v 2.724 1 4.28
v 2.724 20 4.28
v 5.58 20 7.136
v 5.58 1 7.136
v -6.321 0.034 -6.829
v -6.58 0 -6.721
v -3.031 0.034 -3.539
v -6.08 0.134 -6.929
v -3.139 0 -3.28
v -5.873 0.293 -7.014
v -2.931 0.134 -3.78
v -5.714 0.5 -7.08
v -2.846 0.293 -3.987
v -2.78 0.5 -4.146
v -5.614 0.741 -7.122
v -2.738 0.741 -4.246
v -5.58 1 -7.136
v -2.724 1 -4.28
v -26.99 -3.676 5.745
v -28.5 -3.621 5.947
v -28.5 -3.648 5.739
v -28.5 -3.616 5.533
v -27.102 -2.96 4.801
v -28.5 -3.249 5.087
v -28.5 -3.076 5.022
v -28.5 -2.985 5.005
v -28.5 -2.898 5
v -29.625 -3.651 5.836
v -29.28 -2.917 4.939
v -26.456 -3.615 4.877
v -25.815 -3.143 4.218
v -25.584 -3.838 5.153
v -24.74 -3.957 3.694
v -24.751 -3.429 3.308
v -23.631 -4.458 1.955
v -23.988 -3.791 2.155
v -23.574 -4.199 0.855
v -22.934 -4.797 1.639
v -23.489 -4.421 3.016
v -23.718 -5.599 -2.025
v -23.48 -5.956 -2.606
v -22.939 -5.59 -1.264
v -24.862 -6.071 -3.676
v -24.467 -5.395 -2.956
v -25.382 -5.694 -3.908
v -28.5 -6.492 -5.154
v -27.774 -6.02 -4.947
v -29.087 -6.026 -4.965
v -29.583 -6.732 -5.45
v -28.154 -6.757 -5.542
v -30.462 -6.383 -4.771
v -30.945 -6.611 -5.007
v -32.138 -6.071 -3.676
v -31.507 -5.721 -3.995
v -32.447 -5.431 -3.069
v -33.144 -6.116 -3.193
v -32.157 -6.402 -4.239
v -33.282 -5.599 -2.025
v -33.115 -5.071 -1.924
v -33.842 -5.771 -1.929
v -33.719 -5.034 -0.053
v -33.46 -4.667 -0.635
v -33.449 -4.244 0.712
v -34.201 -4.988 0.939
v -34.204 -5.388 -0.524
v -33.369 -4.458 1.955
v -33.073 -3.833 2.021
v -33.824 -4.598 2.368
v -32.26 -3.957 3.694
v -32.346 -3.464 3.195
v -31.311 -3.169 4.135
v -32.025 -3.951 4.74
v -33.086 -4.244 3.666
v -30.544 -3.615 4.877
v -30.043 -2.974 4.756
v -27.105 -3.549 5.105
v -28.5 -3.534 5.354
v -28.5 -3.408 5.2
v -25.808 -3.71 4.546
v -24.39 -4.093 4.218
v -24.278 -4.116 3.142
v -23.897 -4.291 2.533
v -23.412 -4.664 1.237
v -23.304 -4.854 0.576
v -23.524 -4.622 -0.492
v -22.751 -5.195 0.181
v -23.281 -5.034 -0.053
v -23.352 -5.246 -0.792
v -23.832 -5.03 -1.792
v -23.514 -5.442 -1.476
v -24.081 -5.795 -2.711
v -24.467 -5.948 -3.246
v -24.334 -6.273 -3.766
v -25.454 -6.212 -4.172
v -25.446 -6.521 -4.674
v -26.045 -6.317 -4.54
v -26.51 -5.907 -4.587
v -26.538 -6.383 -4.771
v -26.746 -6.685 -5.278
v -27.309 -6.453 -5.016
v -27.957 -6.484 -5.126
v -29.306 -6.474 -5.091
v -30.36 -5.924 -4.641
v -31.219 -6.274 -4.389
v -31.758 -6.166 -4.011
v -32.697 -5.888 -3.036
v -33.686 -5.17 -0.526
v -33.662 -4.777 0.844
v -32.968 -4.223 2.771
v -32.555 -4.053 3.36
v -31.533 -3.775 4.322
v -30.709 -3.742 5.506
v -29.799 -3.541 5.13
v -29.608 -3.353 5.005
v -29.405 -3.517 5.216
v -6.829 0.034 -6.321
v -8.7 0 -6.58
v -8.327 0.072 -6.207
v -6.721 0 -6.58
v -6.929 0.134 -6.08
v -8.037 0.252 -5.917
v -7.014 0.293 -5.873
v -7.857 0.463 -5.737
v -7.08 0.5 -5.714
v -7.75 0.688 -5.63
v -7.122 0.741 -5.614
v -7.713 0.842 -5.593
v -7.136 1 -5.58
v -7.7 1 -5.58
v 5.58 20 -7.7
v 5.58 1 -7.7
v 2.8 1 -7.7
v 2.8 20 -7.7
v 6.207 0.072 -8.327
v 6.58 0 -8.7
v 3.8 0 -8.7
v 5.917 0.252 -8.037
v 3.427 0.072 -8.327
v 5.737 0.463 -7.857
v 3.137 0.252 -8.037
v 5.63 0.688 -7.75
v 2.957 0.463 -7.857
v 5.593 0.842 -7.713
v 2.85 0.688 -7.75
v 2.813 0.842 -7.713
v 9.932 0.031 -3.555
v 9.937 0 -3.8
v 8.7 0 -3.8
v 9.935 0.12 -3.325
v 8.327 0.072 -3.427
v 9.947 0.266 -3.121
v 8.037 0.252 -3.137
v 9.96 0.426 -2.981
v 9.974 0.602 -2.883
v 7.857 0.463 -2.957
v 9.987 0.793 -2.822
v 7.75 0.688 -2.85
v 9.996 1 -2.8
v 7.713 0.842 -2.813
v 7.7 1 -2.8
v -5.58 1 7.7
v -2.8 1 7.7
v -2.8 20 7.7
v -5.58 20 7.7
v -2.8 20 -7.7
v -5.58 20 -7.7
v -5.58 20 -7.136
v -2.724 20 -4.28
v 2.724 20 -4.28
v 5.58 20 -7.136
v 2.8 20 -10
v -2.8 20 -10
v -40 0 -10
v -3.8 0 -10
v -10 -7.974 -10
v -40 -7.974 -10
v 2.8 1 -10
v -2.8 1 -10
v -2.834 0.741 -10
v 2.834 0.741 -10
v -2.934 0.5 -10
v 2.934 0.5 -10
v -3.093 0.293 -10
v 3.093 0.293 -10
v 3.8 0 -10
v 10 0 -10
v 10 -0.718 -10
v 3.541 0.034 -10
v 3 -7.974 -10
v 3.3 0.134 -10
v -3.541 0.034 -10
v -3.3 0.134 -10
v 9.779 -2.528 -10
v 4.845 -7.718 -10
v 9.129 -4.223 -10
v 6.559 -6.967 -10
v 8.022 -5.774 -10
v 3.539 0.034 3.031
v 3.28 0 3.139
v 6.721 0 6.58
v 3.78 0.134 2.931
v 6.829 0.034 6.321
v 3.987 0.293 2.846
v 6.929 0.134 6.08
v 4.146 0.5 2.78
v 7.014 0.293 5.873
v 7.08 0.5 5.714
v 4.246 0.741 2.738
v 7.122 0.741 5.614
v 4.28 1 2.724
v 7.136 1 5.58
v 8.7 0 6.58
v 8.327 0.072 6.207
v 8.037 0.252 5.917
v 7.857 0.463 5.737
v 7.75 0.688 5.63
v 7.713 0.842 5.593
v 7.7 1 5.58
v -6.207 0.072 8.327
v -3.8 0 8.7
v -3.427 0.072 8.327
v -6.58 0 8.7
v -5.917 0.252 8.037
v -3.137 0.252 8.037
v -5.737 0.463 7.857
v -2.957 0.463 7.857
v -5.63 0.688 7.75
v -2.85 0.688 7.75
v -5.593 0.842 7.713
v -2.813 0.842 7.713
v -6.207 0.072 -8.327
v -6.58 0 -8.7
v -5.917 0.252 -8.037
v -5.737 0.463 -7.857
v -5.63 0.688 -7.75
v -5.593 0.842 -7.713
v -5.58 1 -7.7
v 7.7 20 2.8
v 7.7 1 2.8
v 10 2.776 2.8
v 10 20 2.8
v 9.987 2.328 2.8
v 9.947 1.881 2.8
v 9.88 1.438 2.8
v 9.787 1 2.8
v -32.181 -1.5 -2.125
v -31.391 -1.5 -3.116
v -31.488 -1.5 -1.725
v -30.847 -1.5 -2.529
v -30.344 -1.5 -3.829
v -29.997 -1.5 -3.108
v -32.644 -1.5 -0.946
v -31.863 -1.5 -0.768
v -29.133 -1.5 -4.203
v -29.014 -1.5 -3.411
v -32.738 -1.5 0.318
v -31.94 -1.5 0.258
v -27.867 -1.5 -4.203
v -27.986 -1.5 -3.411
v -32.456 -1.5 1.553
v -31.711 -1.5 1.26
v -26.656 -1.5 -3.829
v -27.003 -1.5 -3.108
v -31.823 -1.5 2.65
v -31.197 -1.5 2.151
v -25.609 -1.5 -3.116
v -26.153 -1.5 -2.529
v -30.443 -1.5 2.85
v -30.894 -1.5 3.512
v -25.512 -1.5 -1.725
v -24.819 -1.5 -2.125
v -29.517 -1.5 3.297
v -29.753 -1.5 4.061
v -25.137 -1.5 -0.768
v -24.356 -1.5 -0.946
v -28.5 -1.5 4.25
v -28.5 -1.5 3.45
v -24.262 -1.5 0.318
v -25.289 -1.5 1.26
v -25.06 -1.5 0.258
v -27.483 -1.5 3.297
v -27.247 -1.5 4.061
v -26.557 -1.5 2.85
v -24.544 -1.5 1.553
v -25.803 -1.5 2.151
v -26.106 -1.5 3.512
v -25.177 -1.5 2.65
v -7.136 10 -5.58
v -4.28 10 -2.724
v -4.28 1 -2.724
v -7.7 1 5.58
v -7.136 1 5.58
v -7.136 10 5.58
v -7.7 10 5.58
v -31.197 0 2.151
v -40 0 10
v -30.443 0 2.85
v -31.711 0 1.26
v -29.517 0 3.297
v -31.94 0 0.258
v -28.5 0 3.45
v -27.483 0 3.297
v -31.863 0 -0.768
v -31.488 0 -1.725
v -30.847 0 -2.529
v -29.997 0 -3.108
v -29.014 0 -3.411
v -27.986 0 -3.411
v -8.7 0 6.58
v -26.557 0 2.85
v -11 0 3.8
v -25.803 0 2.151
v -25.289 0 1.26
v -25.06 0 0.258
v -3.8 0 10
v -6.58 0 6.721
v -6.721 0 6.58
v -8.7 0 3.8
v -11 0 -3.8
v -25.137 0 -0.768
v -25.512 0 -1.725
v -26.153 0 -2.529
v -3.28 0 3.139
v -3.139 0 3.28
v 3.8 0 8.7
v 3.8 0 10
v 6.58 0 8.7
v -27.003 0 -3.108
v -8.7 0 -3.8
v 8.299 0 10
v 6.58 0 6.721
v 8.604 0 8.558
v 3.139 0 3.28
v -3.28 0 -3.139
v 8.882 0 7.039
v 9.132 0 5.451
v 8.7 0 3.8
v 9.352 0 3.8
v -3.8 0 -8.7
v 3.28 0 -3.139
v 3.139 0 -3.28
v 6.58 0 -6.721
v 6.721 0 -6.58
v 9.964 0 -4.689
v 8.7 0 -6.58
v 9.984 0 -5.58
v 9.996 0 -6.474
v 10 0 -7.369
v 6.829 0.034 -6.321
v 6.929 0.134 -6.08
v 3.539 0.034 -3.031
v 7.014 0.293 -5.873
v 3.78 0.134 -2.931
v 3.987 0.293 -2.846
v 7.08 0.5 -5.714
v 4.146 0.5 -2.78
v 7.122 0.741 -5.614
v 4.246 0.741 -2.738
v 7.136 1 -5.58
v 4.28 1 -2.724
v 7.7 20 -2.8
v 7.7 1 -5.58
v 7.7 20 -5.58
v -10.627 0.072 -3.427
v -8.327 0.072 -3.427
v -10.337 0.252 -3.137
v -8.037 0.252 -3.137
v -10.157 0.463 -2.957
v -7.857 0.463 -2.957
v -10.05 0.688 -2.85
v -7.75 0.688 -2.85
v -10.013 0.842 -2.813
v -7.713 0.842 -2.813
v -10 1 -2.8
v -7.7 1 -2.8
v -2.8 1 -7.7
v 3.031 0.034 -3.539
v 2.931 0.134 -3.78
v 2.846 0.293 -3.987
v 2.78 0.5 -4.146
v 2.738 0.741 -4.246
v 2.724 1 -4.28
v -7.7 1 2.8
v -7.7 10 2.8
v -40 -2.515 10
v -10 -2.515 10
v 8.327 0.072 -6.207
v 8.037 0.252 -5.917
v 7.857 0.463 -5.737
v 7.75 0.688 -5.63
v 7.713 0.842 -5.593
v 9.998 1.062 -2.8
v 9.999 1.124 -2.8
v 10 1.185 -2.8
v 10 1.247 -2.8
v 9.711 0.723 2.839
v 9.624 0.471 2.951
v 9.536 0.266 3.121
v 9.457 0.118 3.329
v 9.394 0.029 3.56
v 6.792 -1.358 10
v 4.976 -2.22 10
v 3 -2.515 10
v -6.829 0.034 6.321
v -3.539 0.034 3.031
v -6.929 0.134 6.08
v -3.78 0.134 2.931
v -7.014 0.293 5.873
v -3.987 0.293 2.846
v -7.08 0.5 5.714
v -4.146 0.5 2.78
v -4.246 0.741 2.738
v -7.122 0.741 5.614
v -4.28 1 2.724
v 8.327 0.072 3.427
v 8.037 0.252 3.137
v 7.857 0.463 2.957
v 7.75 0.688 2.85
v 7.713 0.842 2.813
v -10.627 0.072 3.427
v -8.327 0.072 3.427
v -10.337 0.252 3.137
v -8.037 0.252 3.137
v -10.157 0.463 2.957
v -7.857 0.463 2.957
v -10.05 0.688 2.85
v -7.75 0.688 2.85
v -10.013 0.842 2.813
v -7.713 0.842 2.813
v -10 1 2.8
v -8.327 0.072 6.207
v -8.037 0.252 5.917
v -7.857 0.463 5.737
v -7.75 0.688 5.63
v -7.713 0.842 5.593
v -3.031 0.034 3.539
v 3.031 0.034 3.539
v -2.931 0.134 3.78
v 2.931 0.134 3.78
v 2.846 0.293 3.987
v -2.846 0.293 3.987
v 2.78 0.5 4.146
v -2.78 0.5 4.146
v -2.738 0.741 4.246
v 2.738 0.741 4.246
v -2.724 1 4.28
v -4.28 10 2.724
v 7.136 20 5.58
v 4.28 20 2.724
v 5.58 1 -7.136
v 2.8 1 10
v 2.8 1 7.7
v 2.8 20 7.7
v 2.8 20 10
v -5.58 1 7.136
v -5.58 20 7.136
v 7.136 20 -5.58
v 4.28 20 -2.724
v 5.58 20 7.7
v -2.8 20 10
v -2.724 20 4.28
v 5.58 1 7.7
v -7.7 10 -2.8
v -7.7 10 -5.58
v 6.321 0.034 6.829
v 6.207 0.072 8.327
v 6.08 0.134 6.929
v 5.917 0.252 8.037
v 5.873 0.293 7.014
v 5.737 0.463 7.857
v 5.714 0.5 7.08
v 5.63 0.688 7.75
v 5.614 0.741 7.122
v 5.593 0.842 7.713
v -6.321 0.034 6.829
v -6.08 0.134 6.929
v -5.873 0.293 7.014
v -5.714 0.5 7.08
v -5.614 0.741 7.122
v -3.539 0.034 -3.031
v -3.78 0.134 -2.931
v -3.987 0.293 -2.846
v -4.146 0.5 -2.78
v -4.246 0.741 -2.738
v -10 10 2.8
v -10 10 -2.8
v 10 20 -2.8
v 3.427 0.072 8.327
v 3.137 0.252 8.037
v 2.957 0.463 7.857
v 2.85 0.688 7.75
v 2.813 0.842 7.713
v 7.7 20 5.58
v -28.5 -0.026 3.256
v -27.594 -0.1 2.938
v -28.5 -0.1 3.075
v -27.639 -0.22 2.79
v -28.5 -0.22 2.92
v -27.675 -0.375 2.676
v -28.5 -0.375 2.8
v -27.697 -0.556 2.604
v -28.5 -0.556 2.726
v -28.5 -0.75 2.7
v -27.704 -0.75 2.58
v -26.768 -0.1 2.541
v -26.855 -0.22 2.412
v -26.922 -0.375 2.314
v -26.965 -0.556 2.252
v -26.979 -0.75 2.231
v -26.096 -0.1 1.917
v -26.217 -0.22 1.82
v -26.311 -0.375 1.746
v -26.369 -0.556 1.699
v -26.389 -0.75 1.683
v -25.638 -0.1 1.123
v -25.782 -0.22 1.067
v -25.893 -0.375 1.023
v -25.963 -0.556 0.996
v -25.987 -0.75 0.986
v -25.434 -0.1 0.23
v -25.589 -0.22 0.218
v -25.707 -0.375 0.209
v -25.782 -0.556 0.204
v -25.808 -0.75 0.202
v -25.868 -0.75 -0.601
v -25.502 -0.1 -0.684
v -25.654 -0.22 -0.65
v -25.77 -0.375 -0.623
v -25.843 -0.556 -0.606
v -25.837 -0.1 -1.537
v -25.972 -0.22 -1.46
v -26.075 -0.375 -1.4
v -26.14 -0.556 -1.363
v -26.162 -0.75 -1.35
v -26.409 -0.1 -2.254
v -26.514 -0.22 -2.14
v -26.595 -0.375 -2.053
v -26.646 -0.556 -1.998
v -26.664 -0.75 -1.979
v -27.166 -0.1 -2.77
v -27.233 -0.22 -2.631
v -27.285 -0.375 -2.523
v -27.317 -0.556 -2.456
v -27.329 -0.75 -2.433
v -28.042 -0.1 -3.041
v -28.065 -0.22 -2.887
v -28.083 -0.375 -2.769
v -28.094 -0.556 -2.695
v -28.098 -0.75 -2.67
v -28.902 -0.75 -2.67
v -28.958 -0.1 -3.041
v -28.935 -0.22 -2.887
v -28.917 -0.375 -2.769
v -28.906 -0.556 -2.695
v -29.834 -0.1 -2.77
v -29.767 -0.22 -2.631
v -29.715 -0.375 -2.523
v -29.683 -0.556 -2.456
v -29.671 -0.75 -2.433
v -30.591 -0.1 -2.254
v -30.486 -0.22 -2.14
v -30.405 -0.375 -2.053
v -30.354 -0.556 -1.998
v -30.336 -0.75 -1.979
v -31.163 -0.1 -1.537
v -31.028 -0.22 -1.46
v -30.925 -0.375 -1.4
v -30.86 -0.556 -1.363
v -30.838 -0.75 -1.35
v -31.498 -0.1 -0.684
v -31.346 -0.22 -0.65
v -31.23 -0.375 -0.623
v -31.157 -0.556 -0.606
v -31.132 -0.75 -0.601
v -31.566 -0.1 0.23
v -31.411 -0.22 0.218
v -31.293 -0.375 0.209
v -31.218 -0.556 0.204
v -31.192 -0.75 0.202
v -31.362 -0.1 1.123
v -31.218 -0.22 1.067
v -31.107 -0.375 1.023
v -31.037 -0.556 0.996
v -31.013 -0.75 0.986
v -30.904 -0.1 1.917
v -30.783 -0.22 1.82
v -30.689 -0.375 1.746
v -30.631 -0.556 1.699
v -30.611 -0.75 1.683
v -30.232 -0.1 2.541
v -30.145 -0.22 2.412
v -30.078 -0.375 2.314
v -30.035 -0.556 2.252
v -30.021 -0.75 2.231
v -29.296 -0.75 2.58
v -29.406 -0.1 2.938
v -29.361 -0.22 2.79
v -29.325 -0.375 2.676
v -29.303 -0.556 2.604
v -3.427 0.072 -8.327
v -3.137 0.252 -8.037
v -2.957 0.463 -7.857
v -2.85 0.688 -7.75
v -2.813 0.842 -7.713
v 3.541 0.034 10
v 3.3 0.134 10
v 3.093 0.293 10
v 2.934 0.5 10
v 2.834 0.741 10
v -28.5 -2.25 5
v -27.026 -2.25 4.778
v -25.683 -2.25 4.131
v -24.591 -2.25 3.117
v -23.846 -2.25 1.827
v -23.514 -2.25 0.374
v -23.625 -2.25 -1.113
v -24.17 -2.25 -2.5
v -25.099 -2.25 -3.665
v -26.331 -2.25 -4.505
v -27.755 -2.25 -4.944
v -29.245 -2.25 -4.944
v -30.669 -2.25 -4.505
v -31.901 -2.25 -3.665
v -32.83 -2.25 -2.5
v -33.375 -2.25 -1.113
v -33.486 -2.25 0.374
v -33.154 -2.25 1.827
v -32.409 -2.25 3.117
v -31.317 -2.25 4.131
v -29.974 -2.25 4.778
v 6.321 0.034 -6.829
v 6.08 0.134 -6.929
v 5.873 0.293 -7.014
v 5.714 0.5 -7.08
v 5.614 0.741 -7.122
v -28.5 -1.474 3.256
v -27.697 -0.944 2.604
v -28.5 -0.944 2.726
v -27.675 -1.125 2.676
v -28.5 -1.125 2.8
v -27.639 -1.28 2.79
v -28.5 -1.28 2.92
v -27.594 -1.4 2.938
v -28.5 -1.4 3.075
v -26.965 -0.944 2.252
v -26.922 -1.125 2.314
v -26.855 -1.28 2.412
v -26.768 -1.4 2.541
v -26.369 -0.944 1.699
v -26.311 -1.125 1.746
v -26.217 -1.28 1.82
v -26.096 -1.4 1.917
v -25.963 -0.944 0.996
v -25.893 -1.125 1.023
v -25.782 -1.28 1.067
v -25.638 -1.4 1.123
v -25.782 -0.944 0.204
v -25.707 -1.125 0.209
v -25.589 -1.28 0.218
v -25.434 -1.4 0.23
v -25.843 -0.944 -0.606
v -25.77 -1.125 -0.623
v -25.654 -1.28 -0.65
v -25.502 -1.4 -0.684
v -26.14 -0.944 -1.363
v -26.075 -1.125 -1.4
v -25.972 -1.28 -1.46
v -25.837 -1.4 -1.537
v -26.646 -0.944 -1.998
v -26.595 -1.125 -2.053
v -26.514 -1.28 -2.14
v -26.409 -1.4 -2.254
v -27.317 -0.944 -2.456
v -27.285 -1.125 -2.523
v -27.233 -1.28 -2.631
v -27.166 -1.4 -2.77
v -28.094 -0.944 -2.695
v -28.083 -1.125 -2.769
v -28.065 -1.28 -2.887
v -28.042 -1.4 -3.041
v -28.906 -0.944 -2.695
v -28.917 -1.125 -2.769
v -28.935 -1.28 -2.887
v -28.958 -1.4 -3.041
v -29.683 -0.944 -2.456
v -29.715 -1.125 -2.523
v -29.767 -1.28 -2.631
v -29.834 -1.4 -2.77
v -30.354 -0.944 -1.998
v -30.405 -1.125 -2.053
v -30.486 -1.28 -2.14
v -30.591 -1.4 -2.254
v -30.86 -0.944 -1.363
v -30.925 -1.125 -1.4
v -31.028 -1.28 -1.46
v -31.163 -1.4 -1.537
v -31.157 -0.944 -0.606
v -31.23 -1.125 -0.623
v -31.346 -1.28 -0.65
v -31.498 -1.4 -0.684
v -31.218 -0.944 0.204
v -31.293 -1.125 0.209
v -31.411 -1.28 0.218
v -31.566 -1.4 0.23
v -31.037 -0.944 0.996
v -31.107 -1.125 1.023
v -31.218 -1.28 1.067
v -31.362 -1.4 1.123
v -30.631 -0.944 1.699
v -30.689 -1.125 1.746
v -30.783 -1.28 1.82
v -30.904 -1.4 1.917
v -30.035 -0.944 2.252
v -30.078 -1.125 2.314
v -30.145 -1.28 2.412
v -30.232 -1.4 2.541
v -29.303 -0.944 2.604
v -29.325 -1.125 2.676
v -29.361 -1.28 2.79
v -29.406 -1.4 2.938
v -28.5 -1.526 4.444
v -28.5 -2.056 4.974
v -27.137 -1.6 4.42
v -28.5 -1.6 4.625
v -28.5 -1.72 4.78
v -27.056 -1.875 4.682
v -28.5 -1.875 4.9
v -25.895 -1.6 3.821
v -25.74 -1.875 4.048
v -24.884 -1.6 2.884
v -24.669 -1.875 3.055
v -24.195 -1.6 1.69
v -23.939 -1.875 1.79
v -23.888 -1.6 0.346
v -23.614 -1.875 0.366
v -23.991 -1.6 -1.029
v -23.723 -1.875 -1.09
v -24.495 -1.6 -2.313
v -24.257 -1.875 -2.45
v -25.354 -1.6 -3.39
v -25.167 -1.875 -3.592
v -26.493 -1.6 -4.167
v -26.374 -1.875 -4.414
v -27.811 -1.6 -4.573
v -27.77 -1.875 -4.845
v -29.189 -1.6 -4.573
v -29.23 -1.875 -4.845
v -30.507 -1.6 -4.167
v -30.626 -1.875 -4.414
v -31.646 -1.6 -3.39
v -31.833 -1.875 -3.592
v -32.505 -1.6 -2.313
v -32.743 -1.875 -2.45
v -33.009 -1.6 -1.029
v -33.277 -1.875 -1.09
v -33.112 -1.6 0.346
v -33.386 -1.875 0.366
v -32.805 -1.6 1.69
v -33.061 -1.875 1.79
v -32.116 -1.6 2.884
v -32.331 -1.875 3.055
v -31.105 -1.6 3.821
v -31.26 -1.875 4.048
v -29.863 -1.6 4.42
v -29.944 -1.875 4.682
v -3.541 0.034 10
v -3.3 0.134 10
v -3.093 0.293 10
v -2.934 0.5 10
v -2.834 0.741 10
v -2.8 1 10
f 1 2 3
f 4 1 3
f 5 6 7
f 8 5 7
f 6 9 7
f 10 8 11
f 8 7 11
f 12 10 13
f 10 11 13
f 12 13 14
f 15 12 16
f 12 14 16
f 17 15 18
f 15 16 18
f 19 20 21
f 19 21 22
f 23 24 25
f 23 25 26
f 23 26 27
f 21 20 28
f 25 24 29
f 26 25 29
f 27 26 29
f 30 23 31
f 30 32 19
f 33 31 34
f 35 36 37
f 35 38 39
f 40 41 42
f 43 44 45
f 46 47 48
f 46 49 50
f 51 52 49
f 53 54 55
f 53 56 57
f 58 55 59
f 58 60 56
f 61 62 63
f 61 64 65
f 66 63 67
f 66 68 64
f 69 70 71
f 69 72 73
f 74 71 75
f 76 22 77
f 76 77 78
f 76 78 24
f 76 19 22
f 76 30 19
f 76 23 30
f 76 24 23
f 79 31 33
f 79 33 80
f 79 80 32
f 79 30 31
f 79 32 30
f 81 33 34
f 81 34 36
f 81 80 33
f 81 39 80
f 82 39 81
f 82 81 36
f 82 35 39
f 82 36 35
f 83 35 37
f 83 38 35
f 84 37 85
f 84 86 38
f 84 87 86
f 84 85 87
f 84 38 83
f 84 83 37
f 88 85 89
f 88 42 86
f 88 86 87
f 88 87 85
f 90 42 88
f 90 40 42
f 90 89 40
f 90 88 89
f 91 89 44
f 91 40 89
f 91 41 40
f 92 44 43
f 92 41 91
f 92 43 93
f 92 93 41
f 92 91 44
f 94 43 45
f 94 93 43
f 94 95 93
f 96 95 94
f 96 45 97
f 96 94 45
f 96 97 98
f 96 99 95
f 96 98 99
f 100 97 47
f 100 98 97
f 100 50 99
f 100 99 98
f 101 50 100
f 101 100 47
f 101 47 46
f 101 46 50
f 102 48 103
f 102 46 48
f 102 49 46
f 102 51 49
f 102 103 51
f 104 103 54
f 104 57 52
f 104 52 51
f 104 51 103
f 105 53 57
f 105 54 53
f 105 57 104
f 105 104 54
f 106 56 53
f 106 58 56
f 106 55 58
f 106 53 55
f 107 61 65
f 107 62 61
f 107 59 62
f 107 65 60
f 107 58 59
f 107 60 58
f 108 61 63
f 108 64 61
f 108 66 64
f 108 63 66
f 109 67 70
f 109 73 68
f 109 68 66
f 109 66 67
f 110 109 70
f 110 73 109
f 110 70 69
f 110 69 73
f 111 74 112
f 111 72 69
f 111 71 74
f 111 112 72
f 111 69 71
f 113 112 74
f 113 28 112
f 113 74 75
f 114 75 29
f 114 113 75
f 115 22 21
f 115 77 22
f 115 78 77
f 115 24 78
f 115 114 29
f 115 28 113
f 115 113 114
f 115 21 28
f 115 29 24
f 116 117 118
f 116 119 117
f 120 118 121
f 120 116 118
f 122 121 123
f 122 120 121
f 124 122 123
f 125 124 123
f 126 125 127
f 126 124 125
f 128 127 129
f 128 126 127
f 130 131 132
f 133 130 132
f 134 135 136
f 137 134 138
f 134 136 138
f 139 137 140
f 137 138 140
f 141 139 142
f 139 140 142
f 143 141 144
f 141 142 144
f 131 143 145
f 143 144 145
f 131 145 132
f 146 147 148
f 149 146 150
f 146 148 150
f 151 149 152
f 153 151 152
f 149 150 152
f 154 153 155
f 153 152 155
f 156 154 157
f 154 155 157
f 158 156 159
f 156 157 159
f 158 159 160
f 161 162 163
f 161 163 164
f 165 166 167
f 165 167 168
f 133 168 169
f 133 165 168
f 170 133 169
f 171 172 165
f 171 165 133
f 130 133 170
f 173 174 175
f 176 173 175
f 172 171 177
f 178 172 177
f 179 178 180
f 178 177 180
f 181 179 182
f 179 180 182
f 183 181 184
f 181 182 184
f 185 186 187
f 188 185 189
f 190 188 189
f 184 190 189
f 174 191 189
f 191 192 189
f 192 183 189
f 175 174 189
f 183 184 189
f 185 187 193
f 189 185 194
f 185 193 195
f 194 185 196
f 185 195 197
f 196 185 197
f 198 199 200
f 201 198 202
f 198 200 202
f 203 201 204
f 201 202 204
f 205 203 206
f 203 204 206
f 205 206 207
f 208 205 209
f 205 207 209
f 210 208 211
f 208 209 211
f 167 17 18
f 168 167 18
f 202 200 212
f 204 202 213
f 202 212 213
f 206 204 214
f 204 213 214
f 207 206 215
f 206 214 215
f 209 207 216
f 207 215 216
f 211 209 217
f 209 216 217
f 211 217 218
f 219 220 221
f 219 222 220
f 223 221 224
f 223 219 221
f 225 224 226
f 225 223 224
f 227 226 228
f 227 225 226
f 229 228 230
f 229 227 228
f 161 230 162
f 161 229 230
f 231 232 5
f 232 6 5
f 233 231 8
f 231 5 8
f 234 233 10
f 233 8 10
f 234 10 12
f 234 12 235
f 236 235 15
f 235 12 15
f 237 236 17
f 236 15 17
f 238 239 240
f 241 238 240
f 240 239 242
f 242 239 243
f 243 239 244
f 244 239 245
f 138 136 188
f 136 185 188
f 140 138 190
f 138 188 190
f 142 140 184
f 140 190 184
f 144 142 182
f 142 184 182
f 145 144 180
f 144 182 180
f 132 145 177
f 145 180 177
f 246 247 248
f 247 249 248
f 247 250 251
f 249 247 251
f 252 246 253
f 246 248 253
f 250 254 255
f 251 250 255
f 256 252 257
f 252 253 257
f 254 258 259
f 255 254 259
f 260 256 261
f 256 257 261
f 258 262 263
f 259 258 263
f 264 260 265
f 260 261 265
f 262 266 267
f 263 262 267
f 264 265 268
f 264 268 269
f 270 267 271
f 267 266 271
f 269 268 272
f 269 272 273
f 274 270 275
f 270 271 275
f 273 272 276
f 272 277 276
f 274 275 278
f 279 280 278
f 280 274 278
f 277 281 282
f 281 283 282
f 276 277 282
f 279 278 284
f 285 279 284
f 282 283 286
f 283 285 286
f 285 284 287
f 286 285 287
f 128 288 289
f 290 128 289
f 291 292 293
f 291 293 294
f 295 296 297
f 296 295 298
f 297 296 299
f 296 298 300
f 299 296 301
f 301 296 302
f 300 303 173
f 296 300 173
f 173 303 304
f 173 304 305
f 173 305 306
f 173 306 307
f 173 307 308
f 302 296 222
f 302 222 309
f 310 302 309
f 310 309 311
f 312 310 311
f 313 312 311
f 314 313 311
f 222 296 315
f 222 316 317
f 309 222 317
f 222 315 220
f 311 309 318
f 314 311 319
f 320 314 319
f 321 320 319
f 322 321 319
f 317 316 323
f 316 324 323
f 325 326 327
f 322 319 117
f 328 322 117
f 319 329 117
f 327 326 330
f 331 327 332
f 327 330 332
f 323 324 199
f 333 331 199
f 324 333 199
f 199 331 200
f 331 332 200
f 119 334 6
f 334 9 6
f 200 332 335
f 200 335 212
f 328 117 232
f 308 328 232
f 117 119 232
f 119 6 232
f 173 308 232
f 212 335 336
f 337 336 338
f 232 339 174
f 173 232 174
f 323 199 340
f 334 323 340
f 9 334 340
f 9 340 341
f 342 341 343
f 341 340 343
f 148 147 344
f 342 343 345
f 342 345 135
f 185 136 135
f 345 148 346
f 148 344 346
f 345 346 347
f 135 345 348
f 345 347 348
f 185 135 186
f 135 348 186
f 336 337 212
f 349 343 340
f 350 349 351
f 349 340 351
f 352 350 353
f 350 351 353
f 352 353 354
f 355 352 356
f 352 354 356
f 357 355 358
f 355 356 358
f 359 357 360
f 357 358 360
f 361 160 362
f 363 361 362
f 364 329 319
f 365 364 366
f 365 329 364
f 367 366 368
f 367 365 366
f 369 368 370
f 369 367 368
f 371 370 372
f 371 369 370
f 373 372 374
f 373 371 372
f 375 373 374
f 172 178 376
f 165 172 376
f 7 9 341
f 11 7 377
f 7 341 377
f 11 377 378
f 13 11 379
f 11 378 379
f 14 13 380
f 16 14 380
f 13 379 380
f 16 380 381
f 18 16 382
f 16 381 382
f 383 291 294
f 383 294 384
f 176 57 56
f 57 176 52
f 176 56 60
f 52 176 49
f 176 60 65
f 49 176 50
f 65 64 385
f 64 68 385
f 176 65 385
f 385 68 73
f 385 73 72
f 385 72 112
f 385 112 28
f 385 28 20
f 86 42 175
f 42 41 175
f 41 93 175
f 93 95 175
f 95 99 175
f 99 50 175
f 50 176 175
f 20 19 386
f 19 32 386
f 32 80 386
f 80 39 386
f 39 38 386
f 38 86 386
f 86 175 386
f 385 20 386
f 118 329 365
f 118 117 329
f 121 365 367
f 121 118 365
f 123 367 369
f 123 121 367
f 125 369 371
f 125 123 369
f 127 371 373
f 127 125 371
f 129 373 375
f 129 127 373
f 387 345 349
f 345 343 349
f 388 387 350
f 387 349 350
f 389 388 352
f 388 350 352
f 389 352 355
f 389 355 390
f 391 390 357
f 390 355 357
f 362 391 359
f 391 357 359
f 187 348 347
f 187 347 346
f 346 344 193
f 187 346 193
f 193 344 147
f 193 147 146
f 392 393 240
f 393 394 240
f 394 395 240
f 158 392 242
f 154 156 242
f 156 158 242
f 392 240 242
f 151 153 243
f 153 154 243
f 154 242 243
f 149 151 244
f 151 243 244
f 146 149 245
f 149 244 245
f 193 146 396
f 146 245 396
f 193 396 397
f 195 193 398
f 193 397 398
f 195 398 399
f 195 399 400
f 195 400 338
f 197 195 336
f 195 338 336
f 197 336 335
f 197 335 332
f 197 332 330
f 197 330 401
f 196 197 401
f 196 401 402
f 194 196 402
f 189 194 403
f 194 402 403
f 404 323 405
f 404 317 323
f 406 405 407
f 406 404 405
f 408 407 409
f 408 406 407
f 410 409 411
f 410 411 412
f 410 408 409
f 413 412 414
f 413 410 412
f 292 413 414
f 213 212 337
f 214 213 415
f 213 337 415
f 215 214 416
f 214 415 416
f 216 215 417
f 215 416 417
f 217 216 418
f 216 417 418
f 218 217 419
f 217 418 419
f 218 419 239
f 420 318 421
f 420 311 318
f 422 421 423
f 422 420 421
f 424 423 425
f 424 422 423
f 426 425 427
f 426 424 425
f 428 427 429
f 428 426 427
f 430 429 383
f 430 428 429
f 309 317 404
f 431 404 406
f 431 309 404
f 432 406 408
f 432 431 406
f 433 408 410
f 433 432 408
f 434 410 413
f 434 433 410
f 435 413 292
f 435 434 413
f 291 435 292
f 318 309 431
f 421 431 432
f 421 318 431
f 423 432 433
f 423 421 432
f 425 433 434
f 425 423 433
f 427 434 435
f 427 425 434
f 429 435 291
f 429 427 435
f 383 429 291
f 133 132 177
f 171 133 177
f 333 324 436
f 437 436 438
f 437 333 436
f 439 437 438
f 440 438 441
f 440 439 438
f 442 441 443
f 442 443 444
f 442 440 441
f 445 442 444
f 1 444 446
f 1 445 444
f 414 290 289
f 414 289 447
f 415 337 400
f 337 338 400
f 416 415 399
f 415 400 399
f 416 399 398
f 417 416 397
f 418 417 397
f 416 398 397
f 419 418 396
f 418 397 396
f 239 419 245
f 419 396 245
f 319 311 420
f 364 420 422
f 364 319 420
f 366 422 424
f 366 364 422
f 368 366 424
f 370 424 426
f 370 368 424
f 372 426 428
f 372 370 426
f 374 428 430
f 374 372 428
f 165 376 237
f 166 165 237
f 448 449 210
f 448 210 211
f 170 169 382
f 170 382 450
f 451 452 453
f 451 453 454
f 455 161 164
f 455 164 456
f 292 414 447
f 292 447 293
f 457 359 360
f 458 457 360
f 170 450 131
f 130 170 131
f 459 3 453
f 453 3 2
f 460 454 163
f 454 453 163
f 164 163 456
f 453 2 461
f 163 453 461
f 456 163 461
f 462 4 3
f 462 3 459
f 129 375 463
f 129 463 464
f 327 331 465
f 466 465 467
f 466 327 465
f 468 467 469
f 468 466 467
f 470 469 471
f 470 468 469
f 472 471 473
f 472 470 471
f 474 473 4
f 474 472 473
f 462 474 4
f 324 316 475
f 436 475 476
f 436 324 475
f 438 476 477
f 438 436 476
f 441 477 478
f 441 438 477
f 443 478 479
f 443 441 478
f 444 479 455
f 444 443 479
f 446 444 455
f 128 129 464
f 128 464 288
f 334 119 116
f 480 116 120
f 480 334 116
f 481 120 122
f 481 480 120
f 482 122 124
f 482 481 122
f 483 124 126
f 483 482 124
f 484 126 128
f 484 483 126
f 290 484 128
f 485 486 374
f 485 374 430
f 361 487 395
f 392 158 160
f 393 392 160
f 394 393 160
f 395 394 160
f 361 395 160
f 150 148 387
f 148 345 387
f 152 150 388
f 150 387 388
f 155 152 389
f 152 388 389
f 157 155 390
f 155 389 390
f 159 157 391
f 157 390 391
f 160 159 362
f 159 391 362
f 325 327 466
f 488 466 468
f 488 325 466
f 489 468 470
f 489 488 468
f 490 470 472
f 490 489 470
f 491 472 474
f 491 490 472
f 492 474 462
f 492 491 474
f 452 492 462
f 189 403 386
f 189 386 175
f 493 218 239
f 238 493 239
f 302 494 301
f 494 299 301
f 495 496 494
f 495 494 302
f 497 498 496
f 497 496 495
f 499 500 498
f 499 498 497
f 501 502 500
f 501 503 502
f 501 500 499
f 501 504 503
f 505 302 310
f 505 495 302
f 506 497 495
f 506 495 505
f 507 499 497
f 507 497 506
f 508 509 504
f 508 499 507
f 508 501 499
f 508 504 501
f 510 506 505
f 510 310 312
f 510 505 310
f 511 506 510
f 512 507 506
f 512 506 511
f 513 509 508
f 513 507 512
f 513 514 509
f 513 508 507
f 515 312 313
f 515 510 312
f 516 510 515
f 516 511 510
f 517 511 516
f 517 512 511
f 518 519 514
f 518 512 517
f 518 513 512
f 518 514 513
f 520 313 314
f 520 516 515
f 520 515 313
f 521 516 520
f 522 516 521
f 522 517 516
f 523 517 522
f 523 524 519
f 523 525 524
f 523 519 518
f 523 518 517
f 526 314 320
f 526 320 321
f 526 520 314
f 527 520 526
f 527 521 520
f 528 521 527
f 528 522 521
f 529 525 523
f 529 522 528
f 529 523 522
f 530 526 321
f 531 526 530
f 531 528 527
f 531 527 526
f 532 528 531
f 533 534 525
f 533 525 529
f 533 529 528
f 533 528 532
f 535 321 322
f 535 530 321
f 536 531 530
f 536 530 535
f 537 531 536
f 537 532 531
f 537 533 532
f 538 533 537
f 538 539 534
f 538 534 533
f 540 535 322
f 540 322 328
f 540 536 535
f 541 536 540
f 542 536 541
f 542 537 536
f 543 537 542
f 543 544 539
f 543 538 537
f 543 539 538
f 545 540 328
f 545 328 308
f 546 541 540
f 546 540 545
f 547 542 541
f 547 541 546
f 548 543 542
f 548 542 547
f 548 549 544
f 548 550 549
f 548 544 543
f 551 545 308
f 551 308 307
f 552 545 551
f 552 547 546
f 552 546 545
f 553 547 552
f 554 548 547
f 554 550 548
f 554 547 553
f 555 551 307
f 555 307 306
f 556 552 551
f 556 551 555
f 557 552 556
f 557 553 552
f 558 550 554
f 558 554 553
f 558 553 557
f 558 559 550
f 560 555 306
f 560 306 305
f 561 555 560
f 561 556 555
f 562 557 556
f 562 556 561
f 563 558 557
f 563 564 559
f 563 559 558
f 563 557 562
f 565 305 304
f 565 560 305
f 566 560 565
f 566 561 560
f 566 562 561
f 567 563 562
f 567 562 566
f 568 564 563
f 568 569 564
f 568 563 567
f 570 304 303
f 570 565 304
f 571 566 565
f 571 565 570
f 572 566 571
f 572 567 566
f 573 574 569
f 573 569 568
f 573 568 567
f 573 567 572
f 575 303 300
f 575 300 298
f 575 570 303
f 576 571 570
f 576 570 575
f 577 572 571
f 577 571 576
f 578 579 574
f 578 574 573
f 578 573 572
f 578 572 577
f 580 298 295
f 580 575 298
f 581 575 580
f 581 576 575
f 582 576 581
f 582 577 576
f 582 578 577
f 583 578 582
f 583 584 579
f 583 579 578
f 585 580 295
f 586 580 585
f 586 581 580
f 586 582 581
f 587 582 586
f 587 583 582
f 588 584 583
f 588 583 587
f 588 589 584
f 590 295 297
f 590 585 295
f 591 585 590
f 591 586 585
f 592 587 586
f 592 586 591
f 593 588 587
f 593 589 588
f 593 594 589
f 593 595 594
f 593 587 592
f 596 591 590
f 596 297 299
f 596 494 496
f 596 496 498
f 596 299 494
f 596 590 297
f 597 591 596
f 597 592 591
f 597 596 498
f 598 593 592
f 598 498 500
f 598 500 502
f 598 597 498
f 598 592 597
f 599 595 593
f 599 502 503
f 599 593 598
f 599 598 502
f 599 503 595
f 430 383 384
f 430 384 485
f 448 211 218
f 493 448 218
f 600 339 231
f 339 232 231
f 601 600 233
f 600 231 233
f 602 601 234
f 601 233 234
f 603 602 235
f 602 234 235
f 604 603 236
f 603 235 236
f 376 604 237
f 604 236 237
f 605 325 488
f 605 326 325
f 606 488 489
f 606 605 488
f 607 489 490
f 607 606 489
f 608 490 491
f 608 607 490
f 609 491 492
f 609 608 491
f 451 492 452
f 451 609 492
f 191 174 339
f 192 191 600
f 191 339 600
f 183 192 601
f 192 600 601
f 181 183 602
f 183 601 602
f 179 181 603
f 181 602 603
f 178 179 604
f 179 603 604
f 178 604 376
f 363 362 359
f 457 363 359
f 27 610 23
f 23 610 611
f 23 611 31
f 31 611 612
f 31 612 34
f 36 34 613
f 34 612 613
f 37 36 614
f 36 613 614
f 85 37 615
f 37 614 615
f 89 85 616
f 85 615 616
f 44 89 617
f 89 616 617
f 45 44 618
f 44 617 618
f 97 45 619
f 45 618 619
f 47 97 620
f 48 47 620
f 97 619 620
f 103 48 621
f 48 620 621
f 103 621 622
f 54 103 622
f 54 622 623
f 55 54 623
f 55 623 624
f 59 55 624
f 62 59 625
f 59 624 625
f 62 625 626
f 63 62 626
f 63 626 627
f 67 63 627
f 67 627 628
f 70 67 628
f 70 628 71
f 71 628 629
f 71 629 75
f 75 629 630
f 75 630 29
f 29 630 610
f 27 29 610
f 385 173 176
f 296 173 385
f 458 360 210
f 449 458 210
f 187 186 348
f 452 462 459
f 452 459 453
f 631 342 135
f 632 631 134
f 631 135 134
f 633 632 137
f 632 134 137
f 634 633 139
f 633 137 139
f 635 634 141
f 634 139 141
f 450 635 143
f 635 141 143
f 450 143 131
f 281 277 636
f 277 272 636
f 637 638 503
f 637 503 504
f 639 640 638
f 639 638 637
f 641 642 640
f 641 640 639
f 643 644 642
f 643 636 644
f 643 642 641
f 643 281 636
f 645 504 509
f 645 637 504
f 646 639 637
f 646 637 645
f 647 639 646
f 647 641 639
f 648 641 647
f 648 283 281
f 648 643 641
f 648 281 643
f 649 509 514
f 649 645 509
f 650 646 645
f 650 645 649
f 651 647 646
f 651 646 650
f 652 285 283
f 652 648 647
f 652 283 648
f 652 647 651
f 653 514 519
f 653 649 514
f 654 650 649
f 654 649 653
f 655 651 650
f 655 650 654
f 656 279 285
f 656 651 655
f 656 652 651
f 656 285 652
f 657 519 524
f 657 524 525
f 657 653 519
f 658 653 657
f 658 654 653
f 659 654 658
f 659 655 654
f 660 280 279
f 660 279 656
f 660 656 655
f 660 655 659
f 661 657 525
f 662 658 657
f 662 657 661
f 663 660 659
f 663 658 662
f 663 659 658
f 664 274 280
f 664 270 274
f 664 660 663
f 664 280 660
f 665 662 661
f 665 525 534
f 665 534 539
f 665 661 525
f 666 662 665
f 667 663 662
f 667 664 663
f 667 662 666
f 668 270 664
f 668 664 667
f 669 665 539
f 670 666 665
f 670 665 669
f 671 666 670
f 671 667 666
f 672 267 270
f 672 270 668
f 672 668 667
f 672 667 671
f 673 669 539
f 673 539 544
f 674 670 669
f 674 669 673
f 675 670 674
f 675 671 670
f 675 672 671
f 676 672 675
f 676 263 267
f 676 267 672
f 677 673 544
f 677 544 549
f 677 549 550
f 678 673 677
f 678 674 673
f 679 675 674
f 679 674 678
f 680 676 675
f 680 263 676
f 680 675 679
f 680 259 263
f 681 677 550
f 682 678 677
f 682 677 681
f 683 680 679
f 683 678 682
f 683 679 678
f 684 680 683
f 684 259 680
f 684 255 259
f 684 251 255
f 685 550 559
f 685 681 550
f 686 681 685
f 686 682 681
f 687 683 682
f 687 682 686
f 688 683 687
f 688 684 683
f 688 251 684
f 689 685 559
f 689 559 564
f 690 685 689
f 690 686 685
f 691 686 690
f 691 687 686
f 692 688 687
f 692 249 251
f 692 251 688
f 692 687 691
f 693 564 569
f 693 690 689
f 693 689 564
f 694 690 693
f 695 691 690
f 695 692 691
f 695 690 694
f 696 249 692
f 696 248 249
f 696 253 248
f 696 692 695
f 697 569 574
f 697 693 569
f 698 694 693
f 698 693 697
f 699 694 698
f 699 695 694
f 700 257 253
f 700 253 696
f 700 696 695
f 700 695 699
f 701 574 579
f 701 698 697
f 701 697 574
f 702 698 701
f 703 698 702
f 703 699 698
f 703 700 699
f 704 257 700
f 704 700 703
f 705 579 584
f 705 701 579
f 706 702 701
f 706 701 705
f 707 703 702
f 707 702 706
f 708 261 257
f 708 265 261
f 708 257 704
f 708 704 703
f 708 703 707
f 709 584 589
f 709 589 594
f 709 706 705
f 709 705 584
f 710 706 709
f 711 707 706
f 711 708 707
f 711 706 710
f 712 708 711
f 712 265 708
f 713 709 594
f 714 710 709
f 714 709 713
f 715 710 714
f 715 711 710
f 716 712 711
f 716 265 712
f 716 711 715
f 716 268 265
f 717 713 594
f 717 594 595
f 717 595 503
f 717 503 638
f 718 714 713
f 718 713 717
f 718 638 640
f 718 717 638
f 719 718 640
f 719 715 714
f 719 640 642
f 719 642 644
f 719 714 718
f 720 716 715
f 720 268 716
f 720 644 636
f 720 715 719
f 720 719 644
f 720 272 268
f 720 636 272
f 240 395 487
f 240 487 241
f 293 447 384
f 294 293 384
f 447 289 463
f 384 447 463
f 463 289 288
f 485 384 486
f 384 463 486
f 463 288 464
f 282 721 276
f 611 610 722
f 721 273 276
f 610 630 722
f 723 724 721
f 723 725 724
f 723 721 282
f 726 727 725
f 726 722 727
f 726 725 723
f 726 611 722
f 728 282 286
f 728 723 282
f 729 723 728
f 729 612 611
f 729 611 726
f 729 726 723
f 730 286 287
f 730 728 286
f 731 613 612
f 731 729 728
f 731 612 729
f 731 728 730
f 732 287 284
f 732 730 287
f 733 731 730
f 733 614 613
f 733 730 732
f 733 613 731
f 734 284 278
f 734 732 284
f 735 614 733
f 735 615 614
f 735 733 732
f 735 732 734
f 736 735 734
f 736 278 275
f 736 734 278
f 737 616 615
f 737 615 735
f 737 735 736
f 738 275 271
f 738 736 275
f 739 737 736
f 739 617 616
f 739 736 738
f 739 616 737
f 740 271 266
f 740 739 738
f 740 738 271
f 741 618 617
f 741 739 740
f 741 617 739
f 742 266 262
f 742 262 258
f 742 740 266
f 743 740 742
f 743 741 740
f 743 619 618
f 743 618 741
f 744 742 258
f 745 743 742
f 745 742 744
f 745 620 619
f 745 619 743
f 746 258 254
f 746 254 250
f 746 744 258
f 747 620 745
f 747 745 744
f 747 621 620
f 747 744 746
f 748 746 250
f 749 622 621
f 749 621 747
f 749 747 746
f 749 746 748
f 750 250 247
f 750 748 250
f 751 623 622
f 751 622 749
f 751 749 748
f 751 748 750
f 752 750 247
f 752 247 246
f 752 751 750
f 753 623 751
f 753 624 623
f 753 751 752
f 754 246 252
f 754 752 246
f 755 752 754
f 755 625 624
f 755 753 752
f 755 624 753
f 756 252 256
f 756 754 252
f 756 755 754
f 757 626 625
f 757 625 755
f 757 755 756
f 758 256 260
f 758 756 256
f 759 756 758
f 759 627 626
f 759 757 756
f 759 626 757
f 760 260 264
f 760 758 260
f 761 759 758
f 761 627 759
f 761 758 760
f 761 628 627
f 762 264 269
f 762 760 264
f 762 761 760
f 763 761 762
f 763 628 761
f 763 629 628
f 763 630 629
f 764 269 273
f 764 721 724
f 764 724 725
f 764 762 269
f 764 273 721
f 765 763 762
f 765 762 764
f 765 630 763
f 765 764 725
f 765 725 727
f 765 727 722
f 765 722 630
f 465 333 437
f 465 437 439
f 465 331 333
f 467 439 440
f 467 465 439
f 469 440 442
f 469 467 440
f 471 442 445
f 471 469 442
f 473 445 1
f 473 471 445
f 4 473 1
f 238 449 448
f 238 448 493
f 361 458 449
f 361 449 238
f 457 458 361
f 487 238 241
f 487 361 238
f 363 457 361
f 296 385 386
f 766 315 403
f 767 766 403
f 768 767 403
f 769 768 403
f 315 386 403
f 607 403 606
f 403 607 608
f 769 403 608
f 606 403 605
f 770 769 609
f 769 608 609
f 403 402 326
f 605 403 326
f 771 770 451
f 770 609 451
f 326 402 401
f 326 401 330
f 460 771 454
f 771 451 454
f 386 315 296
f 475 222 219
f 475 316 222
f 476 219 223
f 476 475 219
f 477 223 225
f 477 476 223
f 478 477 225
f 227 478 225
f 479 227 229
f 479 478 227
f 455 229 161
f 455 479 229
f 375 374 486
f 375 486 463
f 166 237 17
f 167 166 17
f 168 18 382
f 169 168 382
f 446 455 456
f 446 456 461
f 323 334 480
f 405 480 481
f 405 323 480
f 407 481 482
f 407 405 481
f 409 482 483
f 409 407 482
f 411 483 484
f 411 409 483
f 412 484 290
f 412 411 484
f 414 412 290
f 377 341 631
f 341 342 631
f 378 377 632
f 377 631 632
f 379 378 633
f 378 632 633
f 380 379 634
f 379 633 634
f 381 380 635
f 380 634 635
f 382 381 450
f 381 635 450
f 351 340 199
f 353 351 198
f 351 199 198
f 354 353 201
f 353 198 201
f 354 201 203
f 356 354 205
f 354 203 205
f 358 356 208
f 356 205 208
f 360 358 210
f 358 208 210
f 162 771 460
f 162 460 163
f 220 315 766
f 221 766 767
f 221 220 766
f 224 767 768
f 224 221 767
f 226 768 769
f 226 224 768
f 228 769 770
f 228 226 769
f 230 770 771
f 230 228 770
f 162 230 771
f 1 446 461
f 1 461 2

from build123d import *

# Parameters (mm, degrees)
BOSS_EXTRUDE1_DEPTH   = 20
BOSS_EXTRUDE1_2_DEPTH = 20
BOSS_EXTRUDE1_3_DEPTH = 20
BOSS_EXTRUDE1_4_DEPTH = 20
SKETCH2_W             = 20
SKETCH2_H             = 20
BOSS_EXTRUDE2_DEPTH   = 20
CUT_EXTRUDE1_DEPTH    = 31
BOSS_EXTRUDE3_DEPTH   = 30
FILLET1_R             = 7
CUT_EXTRUDE2_REACH    = 47.826
SKETCH5_R             = 2.7
CUT_EXTRUDE3_REACH    = 48.5
SKETCH6_R             = 5
FILLET5_R             = 1
FILLET6_R             = 0.75
CUT_EXTRUDE4_DEPTH    = 10


# Some blends are built 0.0001 mm under size
with BuildPart() as part:
    # Sketch1 → Boss-Extrude1 (new body)
    with BuildSketch(Plane(origin=(0, 0, 0), x_dir=(1, 0, 0), z_dir=(0, 1, 0))):
        Polygon((-10, -2.8), (-10, 2.8), (-7.7, 2.8), (-7.7, 5.58), (-7.135634919, 5.58), (-4.28, 2.724365081), (-4.28, -2.724365081), (-7.135634919, -5.58), (-7.7, -5.58), (-7.7, -2.8), align=None)
    extrude(amount=BOSS_EXTRUDE1_DEPTH)



with BuildPart() as body_2:
    # Sketch1 → Boss-Extrude1 2 (new body)
    with BuildSketch(Plane(origin=(0, 0, 0), x_dir=(1, 0, 0), z_dir=(0, 1, 0))):
        Polygon((10, 2.8), (7.7, 2.8), (7.7, 5.58), (7.135634919, 5.58), (4.28, 2.724365081), (4.28, -2.724365081), (7.135634919, -5.58), (7.7, -5.58), (7.7, -2.8), (10, -2.8), align=None)
    extrude(amount=BOSS_EXTRUDE1_2_DEPTH)


with BuildPart() as body_3:
    # Sketch1 → Boss-Extrude1 3 (new body)
    with BuildSketch(Plane(origin=(0, 0, 0), x_dir=(1, 0, 0), z_dir=(0, 1, 0))):
        Polygon((2.8, -10), (-2.8, -10), (-2.8, -7.7), (-5.58, -7.7), (-5.58, -7.135634919), (-2.724365081, -4.28), (2.724365081, -4.28), (5.58, -7.135634919), (5.58, -7.7), (2.8, -7.7), align=None)
    extrude(amount=BOSS_EXTRUDE1_3_DEPTH)


with BuildPart() as body_4:
    # Sketch1 → Boss-Extrude1 4 (new body)
    with BuildSketch(Plane(origin=(0, 0, 0), x_dir=(1, 0, 0), z_dir=(0, 1, 0))):
        Polygon((-2.8, 10), (-2.8, 7.7), (-5.58, 7.7), (-5.58, 7.135634919), (-2.724365081, 4.28), (2.724365081, 4.28), (5.58, 7.135634919), (5.58, 7.7), (2.8, 7.7), (2.8, 10), align=None)
    extrude(amount=BOSS_EXTRUDE1_4_DEPTH)


with BuildPart() as part_1:
    add(part.part)

    add(body_2.part)  # Boss-Extrude2 merges body 2

    add(body_3.part)  # Boss-Extrude2 merges body 3

    add(body_4.part)  # Boss-Extrude2 merges body 4
    # Sketch2 → Boss-Extrude2 (add)
    with BuildSketch(Plane.XZ):
        Rectangle(SKETCH2_W, SKETCH2_H)
    extrude(amount=BOSS_EXTRUDE2_DEPTH)

    # Sketch3 → Cut-Extrude1 (cut, through all)
    with BuildSketch(Plane(origin=(10, 0, 0), x_dir=(0, 0, -1), z_dir=(1, 0, 0))):
        Polygon((10.596673941, -8.137212268), (10.596673941, -38.345549702), (-10.411138478, -38.345549702), (-10.411138478, -2.402671747), align=None)
    extrude(amount=-CUT_EXTRUDE1_DEPTH, mode=Mode.SUBTRACT)

    # Sketch4 → Boss-Extrude3 (add)
    with BuildSketch(Plane.ZY.offset(10)):
        Polygon((10, 0), (-10, 0), (-10, -7.974337104), (10, -2.51490096), align=None)
    extrude(amount=BOSS_EXTRUDE3_DEPTH)

    # Fillet1
    # the kernel refuses this fillet: 7 mm, written as the material it takes off along each edge
    with BuildSketch(Plane(origin=(10, 2.093496024, 26.882318479), x_dir=(0, 0.9647039130954435, -0.26333697054978655), z_dir=(0, -0.26333697054978655, -0.9647039130954435))) as fillet1_piece_1:
        with BuildLine():
            CenterArc((FILLET1_R, -FILLET1_R), FILLET1_R, 90, 90)
            Line((0, -FILLET1_R), (0, 0))
            Line((0, 0), (FILLET1_R, 0))
        make_face()
    extrude(amount=55.731749637, mode=Mode.SUBTRACT)

    # Cut-Extrude2: up to this plane
    cut_extrude2_end = Plane(origin=(-10, -8.137212268, -10.596673941), z_dir=(0, 0.9647039130954435, -0.26333697054978655))
    # Sketch5 → Cut-Extrude2 (cut, up to the surface)
    with BuildSketch(Plane(origin=(0, 0, 0), x_dir=(1, 0, 0), z_dir=(0, 1, 0)), mode=Mode.PRIVATE) as cut_extrude2_sk1:
        with Locations(Location((-28.5, 0, 0), (0, 0, 270))):
            Circle(SKETCH5_R)
    cut_extrude2_tool1 = split(extrude(cut_extrude2_sk1.sketch, amount=-CUT_EXTRUDE2_REACH, mode=Mode.PRIVATE), bisect_by=cut_extrude2_end, keep=Keep.BOTH, mode=Mode.PRIVATE)
    add(cut_extrude2_tool1.solids().sort_by_distance((-28.5, 0, 0))[0], mode=Mode.SUBTRACT)

    # Cut-Extrude3: up to this plane
    cut_extrude3_end = Plane(origin=(-10, -8.137212268, -10.596673941), z_dir=(0, 0.9647039130954435, -0.26333697054978655))
    # Sketch6 → Cut-Extrude3 (cut, up to the surface)
    with BuildSketch(Plane(origin=(0, -1.5, 0), x_dir=(1, 0, 0), z_dir=(0, 1, 0)), mode=Mode.PRIVATE) as cut_extrude3_sk1:
        with Locations(Location((-28.5, 0, 0), (0, 0, 270))):
            Circle(SKETCH6_R)
    cut_extrude3_tool1 = split(extrude(cut_extrude3_sk1.sketch, amount=-CUT_EXTRUDE3_REACH, mode=Mode.PRIVATE), bisect_by=cut_extrude3_end, keep=Keep.BOTH, mode=Mode.PRIVATE)
    add(cut_extrude3_tool1.solids().sort_by_distance((-28.5, -1.5, 0))[0], mode=Mode.SUBTRACT)

    # Fillet5
    fillet5_edges = [part_1.edges().sort_by_distance(p)[0] for p in [
        (-4.28, 0, 0),
        (-5.707817459, 0, 4.152182541),
        (-7.417817459, 0, 5.58),
        (-7.7, 0, 4.19),
        (-8.85, 0, 2.8),
        (-10, 0, 0),
        (-8.85, 0, -2.8),
        (-7.7, 0, -4.19),
        (-5.707817459, 0, -4.152182541),
        (-7.417817459, 0, -5.58),
        (-2.8, 0, -8.85),
        (-4.19, 0, -7.7),
        (-5.58, 0, -7.417817459),
        (-4.152182541, 0, -5.707817459),
        (0, 0, -4.28),
        (4.152182541, 0, -5.707817459),
        (5.58, 0, -7.417817459),
        (4.19, 0, -7.7),
        (2.8, 0, -8.85),
        (8.79791333, 0, -2.8),
        (7.7, 0, -4.19),
        (7.417817459, 0, -5.58),
        (5.707817459, 0, -4.152182541),
        (4.28, 0, 0),
        (5.707817459, 0, 4.152182541),
        (7.417817459, 0, 5.58),
        (8.583774042, 0, 2.8),
        (7.7, 0, 4.19),
        (2.8, 0, 8.85),
        (4.19, 0, 7.7),
        (5.58, 0, 7.417817459),
        (4.152182541, 0, 5.707817459),
        (0, 0, 4.28),
        (-4.152182541, 0, 5.707817459),
        (-5.58, 0, 7.417817459),
        (-4.19, 0, 7.7),
        (-2.8, 0, 8.85),
    ]]
    fillet(fillet5_edges, radius=FILLET5_R)

    # Fillet6
    fillet6_edges = [part_1.edges().sort_by_distance(p)[0] for p in [
        (-28.5, 0, -2.7),
        (-28.5, -6.609478068, -5),
        (-28.5, -1.5, -2.7),
        (-28.5, -1.5, -5),
    ]]
    fillet(fillet6_edges, radius=FILLET6_R - 0.0001)  # a hair under: the kernel refuses the full size

    # Sketch7 → Cut-Extrude4 (cut)
    with BuildSketch(Plane(origin=(0, 20, 0), x_dir=(1, 0, 0), z_dir=(0, 1, 0))):
        Polygon((-7.555562818, 7.211994187), (-2.766940799, 2.423372169), (-2.766940799, -2.697134544), (-7.555562818, -7.485756562), (-13.102778423, -7.485756562), (-13.102778423, 7.211994187), align=None)
    extrude(amount=-CUT_EXTRUDE4_DEPTH, mode=Mode.SUBTRACT)


solid = part_1.part
